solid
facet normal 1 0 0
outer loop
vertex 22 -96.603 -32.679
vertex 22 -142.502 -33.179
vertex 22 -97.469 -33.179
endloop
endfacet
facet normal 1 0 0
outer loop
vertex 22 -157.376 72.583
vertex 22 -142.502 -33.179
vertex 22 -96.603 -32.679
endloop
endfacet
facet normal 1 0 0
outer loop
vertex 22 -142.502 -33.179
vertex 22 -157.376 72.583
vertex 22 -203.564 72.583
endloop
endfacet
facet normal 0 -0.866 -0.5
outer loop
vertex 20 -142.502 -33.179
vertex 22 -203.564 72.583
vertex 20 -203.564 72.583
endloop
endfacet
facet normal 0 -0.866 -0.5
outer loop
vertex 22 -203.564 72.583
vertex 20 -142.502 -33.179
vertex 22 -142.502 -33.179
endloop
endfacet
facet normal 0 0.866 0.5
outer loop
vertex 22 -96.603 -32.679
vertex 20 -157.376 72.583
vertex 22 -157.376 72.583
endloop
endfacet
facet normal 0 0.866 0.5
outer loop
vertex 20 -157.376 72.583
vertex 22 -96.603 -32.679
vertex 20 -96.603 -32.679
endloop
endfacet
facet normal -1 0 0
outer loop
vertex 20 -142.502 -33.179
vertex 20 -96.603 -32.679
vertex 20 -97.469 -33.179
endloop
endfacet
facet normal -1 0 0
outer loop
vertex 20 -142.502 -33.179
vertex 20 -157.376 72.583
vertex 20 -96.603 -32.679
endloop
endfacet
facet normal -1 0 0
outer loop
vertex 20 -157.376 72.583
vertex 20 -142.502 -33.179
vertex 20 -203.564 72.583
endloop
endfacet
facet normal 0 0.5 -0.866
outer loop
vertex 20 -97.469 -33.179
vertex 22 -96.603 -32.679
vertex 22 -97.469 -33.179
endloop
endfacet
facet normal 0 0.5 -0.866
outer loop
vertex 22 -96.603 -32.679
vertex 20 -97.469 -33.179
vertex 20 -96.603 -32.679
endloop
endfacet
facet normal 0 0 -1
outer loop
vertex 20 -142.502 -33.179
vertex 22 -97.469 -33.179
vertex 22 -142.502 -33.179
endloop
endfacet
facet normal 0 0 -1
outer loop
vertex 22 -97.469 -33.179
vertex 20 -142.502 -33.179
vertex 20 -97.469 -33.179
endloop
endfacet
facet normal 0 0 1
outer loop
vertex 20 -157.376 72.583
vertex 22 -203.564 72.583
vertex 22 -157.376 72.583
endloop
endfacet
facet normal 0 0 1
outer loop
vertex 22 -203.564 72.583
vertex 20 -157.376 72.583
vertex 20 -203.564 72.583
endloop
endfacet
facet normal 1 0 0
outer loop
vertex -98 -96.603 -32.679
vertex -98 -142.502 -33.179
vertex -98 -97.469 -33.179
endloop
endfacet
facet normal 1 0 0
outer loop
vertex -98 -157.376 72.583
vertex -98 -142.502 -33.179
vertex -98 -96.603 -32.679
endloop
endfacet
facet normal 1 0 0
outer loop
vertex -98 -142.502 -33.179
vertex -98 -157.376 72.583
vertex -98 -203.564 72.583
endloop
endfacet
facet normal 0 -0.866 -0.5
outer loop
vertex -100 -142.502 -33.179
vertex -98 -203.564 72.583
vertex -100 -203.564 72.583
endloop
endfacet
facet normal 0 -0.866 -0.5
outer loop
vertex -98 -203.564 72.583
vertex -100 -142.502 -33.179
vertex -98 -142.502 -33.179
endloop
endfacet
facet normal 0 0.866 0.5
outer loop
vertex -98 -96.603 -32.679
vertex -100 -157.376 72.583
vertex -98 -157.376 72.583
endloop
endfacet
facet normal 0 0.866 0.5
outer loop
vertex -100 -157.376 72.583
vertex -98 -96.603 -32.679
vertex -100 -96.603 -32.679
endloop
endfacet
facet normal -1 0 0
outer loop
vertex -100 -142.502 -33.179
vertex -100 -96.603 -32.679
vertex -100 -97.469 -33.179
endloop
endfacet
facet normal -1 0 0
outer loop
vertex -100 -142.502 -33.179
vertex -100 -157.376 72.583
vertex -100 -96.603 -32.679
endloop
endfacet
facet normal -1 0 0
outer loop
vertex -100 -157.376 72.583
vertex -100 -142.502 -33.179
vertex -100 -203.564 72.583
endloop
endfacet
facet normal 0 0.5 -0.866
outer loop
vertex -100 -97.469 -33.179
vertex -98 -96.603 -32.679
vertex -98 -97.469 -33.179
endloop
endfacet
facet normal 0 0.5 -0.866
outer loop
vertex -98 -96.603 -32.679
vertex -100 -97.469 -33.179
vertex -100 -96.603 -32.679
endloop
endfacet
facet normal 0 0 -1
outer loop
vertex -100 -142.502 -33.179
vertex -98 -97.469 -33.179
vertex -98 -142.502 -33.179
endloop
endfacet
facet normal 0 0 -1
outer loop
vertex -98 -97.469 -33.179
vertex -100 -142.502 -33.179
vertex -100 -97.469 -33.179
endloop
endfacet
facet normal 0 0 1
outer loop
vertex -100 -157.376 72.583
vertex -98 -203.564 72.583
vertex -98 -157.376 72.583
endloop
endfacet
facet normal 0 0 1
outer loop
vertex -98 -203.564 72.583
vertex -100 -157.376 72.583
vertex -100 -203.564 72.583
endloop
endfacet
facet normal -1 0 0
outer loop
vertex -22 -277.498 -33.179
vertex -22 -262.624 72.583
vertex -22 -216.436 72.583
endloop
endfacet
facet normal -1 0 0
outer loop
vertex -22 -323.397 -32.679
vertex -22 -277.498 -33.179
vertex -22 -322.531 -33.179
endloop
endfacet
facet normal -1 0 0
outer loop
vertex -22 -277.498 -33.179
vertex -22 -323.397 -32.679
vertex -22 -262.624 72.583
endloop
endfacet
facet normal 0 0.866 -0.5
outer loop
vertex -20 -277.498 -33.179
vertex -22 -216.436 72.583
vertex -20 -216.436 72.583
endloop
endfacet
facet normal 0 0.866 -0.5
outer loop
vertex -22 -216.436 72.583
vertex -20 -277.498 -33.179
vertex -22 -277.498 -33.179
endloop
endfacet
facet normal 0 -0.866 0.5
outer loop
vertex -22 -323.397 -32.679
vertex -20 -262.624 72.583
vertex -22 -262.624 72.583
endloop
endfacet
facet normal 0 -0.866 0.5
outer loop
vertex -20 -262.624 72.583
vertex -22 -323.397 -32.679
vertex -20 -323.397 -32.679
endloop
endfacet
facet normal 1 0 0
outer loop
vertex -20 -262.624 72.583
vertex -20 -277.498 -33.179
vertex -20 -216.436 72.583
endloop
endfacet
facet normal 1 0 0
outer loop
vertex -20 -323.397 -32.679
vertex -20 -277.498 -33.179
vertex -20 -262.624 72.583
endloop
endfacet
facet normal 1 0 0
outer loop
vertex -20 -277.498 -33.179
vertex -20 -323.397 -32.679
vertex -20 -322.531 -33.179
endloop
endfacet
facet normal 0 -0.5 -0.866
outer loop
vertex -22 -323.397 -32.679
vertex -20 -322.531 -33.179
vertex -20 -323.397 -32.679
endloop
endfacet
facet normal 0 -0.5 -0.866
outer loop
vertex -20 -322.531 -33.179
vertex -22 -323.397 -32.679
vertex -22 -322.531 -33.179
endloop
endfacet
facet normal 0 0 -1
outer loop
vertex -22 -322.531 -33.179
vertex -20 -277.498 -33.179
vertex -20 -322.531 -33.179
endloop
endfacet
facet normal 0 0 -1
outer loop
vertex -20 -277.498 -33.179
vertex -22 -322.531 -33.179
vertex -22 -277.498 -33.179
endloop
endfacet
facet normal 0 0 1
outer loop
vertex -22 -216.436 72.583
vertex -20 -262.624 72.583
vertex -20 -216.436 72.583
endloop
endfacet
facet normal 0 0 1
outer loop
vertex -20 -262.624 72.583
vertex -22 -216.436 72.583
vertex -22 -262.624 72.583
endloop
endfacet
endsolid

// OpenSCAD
module side(){
difference(){
translate([20,20,100]) cube([2,150,40]);
translate([19,20,101]) rotate([60,00,0]) cube([4,150,40]);
translate([19,130,0]) rotate([60,00,0]) cube([4,150,40]);

}}

rotate([120,00,0]) side();
translate([-120,0,0]) rotate([120,00,0]) side();
translate([0,-420,0]) rotate([120,0,180]) side();
